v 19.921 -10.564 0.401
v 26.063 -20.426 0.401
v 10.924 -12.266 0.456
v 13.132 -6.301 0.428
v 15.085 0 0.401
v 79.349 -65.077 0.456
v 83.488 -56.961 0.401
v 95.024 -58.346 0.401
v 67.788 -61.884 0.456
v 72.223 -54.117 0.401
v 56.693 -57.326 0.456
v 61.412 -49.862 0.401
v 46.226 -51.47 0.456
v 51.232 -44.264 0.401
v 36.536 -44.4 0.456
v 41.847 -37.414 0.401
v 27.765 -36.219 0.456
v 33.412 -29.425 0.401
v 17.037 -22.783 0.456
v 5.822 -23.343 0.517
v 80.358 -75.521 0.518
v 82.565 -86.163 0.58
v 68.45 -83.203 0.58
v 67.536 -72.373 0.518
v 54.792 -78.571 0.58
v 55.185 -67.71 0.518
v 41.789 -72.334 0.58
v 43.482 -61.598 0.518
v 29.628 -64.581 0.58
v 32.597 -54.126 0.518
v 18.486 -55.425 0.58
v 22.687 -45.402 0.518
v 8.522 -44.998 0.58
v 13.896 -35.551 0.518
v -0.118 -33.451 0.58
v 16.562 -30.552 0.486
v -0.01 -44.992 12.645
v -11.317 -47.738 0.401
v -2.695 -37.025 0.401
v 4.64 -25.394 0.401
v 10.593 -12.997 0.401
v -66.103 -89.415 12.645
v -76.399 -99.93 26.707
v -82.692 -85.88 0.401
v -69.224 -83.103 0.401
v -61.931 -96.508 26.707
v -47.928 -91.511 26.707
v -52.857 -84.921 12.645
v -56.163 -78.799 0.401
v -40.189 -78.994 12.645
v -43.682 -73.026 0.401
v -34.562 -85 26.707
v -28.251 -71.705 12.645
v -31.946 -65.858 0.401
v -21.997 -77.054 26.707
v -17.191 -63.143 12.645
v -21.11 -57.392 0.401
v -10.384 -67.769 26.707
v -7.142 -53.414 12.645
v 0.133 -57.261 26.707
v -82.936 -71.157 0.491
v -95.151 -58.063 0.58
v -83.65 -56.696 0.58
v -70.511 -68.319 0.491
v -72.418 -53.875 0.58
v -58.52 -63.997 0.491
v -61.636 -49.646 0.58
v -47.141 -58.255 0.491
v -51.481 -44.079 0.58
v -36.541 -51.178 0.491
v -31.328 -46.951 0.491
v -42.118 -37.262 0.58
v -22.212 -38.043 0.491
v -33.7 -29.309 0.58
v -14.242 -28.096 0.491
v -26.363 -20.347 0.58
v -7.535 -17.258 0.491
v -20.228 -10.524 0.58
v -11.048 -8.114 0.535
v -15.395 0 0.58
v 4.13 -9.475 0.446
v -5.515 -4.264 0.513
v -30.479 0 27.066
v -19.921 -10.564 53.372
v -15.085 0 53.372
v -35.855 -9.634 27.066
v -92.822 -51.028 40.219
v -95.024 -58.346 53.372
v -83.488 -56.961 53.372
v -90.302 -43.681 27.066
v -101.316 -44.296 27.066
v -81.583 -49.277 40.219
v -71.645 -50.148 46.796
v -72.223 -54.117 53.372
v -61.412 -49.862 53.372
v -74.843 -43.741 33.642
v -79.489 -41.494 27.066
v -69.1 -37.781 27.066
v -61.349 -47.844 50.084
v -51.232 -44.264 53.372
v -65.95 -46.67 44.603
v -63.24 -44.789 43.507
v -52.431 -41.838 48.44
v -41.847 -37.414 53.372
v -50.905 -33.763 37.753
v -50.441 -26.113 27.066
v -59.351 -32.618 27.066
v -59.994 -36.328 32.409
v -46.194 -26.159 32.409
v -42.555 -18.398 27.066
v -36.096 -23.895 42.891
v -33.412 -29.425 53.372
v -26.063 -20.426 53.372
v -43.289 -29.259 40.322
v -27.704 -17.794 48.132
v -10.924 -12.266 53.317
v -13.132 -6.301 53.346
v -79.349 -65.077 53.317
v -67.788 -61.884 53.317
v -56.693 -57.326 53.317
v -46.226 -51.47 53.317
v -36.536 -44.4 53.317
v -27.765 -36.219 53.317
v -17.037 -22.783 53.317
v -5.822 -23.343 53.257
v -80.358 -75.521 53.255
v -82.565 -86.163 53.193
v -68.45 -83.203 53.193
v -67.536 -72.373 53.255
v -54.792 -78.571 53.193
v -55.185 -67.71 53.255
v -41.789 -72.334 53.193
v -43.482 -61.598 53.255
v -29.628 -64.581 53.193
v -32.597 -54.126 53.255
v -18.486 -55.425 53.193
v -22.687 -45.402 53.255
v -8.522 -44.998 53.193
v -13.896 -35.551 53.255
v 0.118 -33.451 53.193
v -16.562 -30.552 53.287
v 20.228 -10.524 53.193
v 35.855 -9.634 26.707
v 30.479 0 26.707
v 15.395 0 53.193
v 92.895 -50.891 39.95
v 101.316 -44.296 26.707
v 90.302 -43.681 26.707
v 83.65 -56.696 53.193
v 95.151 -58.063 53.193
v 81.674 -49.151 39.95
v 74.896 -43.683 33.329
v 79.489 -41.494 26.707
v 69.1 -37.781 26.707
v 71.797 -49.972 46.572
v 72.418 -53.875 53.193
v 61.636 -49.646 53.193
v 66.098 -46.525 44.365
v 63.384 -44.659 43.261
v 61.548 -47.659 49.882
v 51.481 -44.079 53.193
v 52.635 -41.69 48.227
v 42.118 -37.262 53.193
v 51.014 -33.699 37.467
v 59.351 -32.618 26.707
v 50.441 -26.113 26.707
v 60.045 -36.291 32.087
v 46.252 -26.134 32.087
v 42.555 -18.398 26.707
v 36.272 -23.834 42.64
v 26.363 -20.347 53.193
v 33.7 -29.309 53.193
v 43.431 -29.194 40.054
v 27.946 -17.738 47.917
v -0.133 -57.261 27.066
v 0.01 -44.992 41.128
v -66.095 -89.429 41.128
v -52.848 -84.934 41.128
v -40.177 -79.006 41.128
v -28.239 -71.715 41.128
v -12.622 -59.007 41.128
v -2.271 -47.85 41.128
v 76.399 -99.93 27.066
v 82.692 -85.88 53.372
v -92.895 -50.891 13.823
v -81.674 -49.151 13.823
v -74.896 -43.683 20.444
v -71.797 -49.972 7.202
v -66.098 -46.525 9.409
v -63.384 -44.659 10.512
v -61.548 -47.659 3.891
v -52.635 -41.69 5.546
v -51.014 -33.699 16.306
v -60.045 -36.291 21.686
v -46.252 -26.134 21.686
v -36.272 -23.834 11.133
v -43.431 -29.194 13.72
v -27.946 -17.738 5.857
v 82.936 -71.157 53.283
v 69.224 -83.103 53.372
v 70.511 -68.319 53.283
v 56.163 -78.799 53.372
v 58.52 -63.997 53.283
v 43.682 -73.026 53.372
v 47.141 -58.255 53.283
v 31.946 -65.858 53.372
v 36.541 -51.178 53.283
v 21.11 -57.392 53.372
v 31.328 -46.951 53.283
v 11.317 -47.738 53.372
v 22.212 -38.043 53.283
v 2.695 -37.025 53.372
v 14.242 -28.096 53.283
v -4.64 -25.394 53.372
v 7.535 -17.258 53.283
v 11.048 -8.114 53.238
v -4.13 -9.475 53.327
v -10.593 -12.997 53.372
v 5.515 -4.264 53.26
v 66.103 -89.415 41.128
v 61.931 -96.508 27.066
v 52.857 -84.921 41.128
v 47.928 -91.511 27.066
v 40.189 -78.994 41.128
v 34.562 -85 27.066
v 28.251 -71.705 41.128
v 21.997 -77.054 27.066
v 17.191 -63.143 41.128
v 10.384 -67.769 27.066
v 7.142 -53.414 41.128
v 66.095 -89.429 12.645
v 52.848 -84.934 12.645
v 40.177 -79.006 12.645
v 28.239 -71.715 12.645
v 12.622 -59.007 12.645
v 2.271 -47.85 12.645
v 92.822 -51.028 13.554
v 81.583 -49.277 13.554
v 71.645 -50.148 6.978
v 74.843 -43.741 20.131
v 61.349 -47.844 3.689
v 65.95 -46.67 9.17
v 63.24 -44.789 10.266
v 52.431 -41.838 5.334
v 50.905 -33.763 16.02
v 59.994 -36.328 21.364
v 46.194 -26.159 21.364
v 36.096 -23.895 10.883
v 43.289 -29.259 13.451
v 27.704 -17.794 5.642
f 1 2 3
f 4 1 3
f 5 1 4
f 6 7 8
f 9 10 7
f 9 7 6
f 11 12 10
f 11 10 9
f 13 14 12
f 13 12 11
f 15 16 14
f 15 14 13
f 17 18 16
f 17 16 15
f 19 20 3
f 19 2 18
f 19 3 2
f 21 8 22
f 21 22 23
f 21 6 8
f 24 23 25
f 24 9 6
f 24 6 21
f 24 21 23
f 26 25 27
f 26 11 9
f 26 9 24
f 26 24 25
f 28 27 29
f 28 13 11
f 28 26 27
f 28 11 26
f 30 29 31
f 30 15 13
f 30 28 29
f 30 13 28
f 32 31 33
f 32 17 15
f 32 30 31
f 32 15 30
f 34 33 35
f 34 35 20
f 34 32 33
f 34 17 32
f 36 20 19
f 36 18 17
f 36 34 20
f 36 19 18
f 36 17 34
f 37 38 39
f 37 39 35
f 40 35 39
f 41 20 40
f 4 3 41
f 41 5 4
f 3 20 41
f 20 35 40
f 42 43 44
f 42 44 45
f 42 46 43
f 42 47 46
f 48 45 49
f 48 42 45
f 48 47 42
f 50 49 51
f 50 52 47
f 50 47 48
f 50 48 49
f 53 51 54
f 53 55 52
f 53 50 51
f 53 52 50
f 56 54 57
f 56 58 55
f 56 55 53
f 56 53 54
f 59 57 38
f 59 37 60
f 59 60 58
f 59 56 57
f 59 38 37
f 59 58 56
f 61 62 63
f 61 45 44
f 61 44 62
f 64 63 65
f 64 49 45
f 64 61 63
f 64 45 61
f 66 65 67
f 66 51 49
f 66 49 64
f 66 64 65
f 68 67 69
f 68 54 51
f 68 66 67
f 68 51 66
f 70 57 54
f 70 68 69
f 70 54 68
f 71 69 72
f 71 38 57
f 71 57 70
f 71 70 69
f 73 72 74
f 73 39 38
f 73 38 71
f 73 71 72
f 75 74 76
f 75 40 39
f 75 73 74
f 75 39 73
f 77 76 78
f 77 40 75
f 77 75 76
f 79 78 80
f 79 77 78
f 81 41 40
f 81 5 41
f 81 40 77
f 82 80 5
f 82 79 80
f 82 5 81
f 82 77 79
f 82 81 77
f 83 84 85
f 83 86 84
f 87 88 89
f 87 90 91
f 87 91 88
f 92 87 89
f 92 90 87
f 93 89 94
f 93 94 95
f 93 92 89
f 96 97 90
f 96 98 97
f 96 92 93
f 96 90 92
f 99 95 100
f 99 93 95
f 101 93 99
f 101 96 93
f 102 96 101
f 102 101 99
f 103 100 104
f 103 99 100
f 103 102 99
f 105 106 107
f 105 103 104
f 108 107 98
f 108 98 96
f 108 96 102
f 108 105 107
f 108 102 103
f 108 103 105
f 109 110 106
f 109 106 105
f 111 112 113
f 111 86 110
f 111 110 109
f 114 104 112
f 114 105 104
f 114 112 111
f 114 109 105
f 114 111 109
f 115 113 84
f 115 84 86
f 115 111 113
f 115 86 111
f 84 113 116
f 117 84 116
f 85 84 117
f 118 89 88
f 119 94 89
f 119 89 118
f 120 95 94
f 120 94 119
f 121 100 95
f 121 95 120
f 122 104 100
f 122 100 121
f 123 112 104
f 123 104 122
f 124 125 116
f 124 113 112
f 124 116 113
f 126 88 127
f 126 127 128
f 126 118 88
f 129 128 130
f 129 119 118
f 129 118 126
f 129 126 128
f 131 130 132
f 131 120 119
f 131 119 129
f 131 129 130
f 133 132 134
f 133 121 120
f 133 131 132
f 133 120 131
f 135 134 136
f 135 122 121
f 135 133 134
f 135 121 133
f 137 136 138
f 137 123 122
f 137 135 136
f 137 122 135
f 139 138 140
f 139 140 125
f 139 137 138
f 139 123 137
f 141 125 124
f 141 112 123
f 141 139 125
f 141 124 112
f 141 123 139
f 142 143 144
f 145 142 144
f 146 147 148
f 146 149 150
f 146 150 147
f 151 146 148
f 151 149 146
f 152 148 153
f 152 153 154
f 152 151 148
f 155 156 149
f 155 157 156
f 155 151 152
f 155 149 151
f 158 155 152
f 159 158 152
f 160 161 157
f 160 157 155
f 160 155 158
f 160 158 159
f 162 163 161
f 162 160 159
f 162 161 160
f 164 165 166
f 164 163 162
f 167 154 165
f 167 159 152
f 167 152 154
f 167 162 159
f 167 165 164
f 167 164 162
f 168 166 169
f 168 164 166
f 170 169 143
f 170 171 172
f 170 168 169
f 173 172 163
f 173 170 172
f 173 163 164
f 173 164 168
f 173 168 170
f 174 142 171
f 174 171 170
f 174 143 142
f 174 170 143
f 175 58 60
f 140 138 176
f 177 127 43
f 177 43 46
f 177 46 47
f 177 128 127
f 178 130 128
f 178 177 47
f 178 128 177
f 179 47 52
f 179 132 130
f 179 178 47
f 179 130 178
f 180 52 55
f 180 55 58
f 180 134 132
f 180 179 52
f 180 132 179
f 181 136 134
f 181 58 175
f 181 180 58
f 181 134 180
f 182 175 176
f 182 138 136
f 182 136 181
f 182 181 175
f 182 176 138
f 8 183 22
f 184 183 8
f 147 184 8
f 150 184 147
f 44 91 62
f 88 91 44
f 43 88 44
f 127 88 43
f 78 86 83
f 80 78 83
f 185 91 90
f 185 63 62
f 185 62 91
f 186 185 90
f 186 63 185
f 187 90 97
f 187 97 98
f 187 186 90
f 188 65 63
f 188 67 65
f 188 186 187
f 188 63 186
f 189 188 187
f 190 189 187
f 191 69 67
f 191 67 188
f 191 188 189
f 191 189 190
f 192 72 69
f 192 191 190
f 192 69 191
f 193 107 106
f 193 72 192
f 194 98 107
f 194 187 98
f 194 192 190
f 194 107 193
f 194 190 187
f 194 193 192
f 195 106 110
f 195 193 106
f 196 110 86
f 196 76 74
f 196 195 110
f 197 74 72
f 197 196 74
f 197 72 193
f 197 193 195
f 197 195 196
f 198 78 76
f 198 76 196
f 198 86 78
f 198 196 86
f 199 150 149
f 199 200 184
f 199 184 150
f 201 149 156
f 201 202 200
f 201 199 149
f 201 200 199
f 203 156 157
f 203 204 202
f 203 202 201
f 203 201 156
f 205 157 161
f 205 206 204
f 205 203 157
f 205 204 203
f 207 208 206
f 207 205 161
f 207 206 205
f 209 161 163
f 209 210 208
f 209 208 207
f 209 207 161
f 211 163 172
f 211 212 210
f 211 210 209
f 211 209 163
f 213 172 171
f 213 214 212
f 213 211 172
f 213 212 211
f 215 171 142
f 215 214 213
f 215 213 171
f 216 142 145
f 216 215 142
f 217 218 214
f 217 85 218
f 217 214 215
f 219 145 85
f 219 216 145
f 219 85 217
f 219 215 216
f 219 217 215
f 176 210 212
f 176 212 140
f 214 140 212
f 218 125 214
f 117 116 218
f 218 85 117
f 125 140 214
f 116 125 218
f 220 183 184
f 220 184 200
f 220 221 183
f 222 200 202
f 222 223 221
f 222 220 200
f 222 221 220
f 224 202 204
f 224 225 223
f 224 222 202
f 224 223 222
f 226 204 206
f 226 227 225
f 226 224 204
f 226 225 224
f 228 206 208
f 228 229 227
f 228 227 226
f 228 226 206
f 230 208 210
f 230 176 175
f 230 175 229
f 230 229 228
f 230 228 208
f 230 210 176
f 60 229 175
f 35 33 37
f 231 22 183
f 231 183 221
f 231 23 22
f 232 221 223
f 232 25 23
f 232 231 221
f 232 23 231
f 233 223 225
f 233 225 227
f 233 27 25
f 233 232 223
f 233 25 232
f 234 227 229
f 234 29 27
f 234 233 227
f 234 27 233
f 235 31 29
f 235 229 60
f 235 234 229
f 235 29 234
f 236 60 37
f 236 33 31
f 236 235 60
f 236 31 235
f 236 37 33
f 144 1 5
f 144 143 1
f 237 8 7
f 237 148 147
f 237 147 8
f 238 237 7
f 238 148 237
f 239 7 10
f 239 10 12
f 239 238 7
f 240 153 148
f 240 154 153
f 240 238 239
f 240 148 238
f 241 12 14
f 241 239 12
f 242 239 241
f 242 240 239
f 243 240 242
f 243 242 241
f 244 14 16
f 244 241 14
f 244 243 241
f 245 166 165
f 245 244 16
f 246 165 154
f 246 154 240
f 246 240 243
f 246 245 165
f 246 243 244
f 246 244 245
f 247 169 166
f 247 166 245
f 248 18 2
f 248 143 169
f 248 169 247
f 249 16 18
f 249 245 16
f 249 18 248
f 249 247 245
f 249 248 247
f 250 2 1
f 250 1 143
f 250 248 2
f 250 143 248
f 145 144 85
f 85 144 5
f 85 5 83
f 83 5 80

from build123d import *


with BuildPart() as f2:
    # F2: sweep along a path in F1
    with BuildLine(Plane.XY) as f2_path:
        ThreePointArc((-88.857807, -72.113179), (-33.770109, -49.190349), (0, 0))
    # F0 (on Front) → F2 (sweep)
    with BuildSketch(Plane.XZ):
        Polygon((-30.479473, 27.065896), (-15.394954, 0.580283), (15.084519, 0.401054), (30.479473, 26.707437), (15.394954, 53.19305), (-15.084519, 53.372279), align=None)
    sweep(path=f2_path.line)

    # F3: sweep along a path in F1
    with BuildLine(Plane.XY) as f3_path:
        ThreePointArc((88.857807, -72.113179), (33.770109, -49.190349), (0, 0))
    # F0 (on Front) → F3 (sweep)
    with BuildSketch(Plane.XZ):
        Polygon((-30.479473, 27.065896), (-15.394954, 0.580283), (15.084519, 0.401054), (30.479473, 26.707437), (15.394954, 53.19305), (-15.084519, 53.372279), align=None)
    sweep(path=f3_path.line)


solid = f2.part
